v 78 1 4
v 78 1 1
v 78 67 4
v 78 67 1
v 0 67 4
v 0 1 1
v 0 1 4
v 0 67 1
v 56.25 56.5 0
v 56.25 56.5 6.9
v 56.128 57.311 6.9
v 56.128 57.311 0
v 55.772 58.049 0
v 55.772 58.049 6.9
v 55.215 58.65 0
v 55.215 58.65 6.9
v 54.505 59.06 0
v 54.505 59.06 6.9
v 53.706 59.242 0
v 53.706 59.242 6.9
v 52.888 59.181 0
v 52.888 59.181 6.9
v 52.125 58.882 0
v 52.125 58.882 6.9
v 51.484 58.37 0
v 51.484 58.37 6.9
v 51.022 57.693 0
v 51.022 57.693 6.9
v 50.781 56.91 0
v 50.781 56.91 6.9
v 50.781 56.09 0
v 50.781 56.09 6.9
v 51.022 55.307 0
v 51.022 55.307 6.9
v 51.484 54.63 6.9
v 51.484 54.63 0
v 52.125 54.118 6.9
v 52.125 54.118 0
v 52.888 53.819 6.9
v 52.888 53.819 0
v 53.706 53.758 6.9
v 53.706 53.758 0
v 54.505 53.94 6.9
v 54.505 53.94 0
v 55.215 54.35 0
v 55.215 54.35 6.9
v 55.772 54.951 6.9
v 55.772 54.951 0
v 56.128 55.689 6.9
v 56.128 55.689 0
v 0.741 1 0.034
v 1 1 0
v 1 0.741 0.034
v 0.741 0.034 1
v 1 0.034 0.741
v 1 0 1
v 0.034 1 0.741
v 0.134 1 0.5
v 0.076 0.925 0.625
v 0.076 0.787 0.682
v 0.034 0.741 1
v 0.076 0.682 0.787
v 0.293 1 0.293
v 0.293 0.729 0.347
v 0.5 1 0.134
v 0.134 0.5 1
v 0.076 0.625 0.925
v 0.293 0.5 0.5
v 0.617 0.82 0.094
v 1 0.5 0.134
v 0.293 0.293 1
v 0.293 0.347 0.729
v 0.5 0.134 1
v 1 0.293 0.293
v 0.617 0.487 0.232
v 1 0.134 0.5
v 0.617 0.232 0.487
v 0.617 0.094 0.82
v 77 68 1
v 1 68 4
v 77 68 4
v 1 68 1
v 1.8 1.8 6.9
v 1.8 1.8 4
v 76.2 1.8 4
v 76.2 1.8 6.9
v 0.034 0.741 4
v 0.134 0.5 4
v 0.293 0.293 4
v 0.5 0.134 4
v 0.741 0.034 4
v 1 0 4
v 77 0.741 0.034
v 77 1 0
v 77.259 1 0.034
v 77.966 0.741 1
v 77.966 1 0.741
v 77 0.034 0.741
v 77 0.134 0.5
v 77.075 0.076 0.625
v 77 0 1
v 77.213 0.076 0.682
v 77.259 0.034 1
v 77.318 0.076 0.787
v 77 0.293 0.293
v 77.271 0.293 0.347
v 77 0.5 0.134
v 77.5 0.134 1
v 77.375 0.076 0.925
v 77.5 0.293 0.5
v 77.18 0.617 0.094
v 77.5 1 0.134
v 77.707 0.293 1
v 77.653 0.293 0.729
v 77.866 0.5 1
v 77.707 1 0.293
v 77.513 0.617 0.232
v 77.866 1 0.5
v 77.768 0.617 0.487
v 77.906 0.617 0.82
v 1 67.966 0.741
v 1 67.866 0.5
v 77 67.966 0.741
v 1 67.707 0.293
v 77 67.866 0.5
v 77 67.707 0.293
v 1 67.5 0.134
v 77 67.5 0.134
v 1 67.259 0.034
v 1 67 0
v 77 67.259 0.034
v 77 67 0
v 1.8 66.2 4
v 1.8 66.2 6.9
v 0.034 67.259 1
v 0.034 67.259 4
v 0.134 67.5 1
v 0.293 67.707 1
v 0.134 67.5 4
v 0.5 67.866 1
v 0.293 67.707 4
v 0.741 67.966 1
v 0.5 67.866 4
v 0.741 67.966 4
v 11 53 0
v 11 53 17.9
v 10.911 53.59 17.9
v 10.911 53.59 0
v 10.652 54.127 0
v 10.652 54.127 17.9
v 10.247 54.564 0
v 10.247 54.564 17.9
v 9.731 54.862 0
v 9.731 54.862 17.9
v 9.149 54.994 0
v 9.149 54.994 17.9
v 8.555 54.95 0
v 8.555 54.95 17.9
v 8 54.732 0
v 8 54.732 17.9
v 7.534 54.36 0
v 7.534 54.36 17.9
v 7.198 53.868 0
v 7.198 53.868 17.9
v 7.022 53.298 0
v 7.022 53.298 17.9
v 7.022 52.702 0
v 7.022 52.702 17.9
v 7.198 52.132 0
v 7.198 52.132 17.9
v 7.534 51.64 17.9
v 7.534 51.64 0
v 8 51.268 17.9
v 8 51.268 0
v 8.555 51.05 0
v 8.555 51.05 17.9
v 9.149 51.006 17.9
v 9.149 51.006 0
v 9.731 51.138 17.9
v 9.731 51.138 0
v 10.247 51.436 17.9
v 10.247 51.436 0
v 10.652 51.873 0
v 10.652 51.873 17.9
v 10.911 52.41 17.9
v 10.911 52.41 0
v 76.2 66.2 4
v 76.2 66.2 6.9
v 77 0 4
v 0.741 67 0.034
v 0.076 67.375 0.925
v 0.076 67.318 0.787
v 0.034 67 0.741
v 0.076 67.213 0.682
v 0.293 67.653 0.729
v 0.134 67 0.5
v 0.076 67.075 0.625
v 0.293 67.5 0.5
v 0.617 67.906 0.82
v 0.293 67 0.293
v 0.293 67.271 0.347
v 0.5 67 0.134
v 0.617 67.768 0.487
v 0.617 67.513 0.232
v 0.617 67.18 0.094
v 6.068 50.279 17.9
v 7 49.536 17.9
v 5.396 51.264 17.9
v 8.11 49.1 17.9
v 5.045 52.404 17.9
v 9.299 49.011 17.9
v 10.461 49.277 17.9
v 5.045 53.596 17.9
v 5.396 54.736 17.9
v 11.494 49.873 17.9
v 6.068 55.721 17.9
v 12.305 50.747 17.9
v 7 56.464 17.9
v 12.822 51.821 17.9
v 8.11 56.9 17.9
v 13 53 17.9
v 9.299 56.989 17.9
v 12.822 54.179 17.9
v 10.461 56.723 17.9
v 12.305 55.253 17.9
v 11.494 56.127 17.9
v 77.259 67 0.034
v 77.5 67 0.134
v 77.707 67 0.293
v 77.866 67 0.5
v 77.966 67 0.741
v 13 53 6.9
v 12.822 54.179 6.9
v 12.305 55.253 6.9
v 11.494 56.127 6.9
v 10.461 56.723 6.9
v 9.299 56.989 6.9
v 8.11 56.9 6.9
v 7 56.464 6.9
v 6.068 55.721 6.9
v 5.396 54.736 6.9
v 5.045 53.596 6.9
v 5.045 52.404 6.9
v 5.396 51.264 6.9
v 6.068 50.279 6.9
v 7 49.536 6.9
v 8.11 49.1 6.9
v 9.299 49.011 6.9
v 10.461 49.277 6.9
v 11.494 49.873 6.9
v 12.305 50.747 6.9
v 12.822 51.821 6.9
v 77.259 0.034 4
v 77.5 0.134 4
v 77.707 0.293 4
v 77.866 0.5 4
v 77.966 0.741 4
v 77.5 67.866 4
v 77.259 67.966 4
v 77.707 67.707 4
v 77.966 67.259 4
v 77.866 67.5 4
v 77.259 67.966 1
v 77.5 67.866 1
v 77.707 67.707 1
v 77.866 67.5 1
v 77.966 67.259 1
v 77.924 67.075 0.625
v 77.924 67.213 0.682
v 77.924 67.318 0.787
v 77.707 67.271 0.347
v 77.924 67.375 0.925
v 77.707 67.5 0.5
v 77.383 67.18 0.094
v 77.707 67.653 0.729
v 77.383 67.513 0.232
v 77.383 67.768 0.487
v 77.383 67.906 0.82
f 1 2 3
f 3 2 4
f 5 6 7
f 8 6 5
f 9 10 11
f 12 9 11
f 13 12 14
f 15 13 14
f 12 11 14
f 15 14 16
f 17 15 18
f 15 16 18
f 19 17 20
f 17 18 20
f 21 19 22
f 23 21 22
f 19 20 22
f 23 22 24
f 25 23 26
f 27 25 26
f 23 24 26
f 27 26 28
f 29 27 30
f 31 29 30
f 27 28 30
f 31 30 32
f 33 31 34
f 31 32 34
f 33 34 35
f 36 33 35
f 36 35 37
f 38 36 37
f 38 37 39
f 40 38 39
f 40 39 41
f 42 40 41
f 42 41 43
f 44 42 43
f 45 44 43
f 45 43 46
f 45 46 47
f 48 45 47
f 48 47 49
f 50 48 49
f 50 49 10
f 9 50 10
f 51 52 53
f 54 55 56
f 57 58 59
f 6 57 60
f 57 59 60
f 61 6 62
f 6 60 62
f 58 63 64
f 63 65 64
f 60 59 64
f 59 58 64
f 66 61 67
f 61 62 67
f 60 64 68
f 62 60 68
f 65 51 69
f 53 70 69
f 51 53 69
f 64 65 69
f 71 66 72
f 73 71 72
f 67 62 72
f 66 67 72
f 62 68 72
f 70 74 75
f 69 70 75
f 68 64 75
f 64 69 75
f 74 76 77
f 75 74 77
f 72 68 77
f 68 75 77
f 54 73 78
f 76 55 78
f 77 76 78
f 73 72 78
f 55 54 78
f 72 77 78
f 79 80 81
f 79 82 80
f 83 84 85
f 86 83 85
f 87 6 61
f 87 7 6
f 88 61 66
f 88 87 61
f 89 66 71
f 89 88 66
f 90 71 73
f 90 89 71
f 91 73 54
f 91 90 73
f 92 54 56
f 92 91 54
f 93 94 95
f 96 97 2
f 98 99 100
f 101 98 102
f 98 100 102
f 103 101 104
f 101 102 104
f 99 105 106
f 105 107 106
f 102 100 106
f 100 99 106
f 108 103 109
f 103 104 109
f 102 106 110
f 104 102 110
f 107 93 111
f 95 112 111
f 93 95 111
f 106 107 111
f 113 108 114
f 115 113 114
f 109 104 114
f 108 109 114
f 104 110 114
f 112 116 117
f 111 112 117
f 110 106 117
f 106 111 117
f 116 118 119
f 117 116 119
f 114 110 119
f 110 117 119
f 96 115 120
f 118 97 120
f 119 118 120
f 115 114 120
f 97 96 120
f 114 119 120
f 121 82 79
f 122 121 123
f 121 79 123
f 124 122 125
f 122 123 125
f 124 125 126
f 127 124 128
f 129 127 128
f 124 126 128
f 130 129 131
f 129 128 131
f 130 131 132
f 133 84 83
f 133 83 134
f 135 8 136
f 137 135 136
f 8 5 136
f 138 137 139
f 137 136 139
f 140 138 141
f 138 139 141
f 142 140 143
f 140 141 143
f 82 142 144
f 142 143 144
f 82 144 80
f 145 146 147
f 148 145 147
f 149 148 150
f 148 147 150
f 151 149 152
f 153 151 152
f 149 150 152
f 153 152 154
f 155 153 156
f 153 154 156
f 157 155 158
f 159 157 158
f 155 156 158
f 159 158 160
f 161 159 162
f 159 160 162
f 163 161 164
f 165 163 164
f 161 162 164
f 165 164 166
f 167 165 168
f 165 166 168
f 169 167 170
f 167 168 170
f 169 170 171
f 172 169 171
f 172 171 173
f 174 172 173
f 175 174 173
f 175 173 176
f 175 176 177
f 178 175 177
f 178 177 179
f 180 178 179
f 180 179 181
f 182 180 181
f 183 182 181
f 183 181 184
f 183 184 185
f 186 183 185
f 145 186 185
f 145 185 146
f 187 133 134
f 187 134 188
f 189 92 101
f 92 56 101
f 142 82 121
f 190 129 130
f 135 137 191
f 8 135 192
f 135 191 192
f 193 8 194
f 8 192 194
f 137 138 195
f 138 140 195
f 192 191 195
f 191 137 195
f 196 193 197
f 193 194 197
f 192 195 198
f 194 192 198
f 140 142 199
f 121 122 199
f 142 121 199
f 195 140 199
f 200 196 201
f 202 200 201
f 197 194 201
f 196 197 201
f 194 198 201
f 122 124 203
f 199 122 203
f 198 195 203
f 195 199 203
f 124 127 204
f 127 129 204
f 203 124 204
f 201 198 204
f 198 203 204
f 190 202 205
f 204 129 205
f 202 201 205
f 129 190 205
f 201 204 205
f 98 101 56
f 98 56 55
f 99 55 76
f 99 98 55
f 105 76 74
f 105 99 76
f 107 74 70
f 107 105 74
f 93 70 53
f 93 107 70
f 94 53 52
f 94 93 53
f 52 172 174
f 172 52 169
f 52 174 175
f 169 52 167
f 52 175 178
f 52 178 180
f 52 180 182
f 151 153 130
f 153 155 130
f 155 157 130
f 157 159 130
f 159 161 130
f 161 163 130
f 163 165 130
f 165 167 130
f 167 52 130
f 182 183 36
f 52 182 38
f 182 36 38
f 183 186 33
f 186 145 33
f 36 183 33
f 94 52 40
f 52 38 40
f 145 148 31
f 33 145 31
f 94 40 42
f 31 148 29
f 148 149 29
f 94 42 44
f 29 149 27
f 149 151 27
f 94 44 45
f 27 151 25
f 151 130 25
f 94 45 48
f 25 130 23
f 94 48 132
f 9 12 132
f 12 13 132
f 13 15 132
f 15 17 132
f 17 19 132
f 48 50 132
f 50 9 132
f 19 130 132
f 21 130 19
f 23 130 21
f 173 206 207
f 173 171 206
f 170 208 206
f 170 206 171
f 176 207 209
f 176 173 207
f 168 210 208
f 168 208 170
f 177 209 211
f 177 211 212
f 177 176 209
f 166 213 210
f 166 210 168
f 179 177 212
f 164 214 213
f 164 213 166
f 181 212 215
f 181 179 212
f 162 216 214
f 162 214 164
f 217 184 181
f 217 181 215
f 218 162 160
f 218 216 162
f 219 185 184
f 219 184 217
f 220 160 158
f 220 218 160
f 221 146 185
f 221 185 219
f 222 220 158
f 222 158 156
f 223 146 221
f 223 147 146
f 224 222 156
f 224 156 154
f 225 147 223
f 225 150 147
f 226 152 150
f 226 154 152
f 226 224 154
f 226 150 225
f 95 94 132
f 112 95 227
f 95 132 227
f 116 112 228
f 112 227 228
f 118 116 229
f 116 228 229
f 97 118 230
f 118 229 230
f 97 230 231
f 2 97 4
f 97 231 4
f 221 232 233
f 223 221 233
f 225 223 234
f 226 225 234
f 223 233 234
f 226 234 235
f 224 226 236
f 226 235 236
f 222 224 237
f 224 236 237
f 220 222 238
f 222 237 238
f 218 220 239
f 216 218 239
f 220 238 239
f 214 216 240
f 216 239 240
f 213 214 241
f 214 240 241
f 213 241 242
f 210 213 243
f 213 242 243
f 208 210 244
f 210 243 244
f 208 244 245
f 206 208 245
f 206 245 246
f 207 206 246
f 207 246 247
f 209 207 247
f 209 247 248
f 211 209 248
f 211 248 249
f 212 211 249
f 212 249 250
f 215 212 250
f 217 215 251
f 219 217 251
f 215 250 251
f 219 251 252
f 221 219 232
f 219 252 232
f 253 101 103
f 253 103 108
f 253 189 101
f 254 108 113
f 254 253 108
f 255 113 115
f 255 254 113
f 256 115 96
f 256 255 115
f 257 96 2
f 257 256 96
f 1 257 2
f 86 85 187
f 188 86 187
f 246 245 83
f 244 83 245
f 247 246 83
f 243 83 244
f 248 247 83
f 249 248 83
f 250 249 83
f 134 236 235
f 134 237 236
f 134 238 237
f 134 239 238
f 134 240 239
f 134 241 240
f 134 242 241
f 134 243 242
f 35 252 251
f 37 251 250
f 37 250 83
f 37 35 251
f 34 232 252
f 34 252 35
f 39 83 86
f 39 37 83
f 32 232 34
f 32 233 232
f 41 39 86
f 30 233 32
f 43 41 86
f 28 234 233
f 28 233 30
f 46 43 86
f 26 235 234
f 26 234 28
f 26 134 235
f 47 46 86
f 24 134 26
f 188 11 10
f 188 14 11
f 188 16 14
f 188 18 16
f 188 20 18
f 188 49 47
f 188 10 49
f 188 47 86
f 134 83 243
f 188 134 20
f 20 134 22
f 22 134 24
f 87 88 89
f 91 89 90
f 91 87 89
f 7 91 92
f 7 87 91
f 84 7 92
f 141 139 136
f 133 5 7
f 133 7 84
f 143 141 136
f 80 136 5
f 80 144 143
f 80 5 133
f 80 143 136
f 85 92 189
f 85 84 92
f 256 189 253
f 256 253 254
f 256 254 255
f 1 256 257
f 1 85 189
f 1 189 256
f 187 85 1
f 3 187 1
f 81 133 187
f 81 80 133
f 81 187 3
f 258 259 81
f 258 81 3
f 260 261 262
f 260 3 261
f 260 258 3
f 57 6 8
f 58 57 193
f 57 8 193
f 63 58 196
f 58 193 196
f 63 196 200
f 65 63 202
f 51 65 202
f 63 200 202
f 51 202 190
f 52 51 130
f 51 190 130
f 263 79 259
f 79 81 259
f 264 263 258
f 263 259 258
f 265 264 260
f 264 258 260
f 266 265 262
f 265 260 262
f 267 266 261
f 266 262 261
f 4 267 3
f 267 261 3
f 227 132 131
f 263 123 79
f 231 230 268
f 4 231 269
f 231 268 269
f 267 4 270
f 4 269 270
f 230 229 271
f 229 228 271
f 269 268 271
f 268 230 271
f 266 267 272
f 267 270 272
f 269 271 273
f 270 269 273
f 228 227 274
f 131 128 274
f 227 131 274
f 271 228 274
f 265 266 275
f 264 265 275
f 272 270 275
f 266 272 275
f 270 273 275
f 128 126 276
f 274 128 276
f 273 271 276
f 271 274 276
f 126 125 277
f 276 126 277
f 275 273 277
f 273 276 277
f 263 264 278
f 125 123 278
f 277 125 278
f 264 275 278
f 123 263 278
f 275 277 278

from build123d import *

# Parameters (mm, degrees)
SKETCH_W        = 78
SKETCH_H        = 68
PAD_DEPTH       = 4
SKETCH001_W     = 74.4
SKETCH001_H     = 64.4
PAD001_DEPTH    = 2.9
SKETCH002_R     = 4
PAD002_DEPTH    = 11
SKETCH003_R     = 2
POCKET_DEPTH    = 17.901
SKETCH004_R     = 2.75
POCKET001_DEPTH = 6.901
FILLET_R        = 1


with BuildPart() as part:
    # Sketch → Pad (new body)
    with BuildSketch(Plane.XY):
        with Locations((39, 34)):
            Rectangle(SKETCH_W, SKETCH_H)
    extrude(amount=PAD_DEPTH)

    # Sketch001 (on Face6 of Pad) → Pad001 (join)
    with BuildSketch(Plane.XY.offset(4)):
        with Locations((39, 34)):
            Rectangle(SKETCH001_W, SKETCH001_H)
    extrude(amount=PAD001_DEPTH)

    # Sketch002 (on Face11 of Pad001) → Pad002 (join)
    with BuildSketch(Plane.XY.offset(6.9)):
        with Locations((9, 53)):
            Circle(SKETCH002_R)
    extrude(amount=PAD002_DEPTH)

    # Sketch003 (on Face13 of Pad002) → Pocket (cut, through all)
    with BuildSketch(Plane.XY.offset(17.9)):
        with Locations((9, 53)):
            Circle(SKETCH003_R)
    extrude(amount=-POCKET_DEPTH, mode=Mode.SUBTRACT)

    # Sketch004 (on Face13 of Pocket) → Pocket001 (cut, through all)
    with BuildSketch(Plane.XY.offset(6.9)):
        with Locations((53.5, 56.5)):
            Circle(SKETCH004_R)
    extrude(amount=-POCKET001_DEPTH, mode=Mode.SUBTRACT)

    # Fillet
    fillet_edges = [part.edges().sort_by_distance(p)[0] for p in [
        (39, 68, 0),
        (78, 34, 0),
        (78, 68, 2),
        (0, 68, 2),
        (39, 0, 0),
        (0, 34, 0),
        (78, 0, 2),
        (0, 0, 2),
    ]]
    fillet(fillet_edges, radius=FILLET_R)


solid = part.part
